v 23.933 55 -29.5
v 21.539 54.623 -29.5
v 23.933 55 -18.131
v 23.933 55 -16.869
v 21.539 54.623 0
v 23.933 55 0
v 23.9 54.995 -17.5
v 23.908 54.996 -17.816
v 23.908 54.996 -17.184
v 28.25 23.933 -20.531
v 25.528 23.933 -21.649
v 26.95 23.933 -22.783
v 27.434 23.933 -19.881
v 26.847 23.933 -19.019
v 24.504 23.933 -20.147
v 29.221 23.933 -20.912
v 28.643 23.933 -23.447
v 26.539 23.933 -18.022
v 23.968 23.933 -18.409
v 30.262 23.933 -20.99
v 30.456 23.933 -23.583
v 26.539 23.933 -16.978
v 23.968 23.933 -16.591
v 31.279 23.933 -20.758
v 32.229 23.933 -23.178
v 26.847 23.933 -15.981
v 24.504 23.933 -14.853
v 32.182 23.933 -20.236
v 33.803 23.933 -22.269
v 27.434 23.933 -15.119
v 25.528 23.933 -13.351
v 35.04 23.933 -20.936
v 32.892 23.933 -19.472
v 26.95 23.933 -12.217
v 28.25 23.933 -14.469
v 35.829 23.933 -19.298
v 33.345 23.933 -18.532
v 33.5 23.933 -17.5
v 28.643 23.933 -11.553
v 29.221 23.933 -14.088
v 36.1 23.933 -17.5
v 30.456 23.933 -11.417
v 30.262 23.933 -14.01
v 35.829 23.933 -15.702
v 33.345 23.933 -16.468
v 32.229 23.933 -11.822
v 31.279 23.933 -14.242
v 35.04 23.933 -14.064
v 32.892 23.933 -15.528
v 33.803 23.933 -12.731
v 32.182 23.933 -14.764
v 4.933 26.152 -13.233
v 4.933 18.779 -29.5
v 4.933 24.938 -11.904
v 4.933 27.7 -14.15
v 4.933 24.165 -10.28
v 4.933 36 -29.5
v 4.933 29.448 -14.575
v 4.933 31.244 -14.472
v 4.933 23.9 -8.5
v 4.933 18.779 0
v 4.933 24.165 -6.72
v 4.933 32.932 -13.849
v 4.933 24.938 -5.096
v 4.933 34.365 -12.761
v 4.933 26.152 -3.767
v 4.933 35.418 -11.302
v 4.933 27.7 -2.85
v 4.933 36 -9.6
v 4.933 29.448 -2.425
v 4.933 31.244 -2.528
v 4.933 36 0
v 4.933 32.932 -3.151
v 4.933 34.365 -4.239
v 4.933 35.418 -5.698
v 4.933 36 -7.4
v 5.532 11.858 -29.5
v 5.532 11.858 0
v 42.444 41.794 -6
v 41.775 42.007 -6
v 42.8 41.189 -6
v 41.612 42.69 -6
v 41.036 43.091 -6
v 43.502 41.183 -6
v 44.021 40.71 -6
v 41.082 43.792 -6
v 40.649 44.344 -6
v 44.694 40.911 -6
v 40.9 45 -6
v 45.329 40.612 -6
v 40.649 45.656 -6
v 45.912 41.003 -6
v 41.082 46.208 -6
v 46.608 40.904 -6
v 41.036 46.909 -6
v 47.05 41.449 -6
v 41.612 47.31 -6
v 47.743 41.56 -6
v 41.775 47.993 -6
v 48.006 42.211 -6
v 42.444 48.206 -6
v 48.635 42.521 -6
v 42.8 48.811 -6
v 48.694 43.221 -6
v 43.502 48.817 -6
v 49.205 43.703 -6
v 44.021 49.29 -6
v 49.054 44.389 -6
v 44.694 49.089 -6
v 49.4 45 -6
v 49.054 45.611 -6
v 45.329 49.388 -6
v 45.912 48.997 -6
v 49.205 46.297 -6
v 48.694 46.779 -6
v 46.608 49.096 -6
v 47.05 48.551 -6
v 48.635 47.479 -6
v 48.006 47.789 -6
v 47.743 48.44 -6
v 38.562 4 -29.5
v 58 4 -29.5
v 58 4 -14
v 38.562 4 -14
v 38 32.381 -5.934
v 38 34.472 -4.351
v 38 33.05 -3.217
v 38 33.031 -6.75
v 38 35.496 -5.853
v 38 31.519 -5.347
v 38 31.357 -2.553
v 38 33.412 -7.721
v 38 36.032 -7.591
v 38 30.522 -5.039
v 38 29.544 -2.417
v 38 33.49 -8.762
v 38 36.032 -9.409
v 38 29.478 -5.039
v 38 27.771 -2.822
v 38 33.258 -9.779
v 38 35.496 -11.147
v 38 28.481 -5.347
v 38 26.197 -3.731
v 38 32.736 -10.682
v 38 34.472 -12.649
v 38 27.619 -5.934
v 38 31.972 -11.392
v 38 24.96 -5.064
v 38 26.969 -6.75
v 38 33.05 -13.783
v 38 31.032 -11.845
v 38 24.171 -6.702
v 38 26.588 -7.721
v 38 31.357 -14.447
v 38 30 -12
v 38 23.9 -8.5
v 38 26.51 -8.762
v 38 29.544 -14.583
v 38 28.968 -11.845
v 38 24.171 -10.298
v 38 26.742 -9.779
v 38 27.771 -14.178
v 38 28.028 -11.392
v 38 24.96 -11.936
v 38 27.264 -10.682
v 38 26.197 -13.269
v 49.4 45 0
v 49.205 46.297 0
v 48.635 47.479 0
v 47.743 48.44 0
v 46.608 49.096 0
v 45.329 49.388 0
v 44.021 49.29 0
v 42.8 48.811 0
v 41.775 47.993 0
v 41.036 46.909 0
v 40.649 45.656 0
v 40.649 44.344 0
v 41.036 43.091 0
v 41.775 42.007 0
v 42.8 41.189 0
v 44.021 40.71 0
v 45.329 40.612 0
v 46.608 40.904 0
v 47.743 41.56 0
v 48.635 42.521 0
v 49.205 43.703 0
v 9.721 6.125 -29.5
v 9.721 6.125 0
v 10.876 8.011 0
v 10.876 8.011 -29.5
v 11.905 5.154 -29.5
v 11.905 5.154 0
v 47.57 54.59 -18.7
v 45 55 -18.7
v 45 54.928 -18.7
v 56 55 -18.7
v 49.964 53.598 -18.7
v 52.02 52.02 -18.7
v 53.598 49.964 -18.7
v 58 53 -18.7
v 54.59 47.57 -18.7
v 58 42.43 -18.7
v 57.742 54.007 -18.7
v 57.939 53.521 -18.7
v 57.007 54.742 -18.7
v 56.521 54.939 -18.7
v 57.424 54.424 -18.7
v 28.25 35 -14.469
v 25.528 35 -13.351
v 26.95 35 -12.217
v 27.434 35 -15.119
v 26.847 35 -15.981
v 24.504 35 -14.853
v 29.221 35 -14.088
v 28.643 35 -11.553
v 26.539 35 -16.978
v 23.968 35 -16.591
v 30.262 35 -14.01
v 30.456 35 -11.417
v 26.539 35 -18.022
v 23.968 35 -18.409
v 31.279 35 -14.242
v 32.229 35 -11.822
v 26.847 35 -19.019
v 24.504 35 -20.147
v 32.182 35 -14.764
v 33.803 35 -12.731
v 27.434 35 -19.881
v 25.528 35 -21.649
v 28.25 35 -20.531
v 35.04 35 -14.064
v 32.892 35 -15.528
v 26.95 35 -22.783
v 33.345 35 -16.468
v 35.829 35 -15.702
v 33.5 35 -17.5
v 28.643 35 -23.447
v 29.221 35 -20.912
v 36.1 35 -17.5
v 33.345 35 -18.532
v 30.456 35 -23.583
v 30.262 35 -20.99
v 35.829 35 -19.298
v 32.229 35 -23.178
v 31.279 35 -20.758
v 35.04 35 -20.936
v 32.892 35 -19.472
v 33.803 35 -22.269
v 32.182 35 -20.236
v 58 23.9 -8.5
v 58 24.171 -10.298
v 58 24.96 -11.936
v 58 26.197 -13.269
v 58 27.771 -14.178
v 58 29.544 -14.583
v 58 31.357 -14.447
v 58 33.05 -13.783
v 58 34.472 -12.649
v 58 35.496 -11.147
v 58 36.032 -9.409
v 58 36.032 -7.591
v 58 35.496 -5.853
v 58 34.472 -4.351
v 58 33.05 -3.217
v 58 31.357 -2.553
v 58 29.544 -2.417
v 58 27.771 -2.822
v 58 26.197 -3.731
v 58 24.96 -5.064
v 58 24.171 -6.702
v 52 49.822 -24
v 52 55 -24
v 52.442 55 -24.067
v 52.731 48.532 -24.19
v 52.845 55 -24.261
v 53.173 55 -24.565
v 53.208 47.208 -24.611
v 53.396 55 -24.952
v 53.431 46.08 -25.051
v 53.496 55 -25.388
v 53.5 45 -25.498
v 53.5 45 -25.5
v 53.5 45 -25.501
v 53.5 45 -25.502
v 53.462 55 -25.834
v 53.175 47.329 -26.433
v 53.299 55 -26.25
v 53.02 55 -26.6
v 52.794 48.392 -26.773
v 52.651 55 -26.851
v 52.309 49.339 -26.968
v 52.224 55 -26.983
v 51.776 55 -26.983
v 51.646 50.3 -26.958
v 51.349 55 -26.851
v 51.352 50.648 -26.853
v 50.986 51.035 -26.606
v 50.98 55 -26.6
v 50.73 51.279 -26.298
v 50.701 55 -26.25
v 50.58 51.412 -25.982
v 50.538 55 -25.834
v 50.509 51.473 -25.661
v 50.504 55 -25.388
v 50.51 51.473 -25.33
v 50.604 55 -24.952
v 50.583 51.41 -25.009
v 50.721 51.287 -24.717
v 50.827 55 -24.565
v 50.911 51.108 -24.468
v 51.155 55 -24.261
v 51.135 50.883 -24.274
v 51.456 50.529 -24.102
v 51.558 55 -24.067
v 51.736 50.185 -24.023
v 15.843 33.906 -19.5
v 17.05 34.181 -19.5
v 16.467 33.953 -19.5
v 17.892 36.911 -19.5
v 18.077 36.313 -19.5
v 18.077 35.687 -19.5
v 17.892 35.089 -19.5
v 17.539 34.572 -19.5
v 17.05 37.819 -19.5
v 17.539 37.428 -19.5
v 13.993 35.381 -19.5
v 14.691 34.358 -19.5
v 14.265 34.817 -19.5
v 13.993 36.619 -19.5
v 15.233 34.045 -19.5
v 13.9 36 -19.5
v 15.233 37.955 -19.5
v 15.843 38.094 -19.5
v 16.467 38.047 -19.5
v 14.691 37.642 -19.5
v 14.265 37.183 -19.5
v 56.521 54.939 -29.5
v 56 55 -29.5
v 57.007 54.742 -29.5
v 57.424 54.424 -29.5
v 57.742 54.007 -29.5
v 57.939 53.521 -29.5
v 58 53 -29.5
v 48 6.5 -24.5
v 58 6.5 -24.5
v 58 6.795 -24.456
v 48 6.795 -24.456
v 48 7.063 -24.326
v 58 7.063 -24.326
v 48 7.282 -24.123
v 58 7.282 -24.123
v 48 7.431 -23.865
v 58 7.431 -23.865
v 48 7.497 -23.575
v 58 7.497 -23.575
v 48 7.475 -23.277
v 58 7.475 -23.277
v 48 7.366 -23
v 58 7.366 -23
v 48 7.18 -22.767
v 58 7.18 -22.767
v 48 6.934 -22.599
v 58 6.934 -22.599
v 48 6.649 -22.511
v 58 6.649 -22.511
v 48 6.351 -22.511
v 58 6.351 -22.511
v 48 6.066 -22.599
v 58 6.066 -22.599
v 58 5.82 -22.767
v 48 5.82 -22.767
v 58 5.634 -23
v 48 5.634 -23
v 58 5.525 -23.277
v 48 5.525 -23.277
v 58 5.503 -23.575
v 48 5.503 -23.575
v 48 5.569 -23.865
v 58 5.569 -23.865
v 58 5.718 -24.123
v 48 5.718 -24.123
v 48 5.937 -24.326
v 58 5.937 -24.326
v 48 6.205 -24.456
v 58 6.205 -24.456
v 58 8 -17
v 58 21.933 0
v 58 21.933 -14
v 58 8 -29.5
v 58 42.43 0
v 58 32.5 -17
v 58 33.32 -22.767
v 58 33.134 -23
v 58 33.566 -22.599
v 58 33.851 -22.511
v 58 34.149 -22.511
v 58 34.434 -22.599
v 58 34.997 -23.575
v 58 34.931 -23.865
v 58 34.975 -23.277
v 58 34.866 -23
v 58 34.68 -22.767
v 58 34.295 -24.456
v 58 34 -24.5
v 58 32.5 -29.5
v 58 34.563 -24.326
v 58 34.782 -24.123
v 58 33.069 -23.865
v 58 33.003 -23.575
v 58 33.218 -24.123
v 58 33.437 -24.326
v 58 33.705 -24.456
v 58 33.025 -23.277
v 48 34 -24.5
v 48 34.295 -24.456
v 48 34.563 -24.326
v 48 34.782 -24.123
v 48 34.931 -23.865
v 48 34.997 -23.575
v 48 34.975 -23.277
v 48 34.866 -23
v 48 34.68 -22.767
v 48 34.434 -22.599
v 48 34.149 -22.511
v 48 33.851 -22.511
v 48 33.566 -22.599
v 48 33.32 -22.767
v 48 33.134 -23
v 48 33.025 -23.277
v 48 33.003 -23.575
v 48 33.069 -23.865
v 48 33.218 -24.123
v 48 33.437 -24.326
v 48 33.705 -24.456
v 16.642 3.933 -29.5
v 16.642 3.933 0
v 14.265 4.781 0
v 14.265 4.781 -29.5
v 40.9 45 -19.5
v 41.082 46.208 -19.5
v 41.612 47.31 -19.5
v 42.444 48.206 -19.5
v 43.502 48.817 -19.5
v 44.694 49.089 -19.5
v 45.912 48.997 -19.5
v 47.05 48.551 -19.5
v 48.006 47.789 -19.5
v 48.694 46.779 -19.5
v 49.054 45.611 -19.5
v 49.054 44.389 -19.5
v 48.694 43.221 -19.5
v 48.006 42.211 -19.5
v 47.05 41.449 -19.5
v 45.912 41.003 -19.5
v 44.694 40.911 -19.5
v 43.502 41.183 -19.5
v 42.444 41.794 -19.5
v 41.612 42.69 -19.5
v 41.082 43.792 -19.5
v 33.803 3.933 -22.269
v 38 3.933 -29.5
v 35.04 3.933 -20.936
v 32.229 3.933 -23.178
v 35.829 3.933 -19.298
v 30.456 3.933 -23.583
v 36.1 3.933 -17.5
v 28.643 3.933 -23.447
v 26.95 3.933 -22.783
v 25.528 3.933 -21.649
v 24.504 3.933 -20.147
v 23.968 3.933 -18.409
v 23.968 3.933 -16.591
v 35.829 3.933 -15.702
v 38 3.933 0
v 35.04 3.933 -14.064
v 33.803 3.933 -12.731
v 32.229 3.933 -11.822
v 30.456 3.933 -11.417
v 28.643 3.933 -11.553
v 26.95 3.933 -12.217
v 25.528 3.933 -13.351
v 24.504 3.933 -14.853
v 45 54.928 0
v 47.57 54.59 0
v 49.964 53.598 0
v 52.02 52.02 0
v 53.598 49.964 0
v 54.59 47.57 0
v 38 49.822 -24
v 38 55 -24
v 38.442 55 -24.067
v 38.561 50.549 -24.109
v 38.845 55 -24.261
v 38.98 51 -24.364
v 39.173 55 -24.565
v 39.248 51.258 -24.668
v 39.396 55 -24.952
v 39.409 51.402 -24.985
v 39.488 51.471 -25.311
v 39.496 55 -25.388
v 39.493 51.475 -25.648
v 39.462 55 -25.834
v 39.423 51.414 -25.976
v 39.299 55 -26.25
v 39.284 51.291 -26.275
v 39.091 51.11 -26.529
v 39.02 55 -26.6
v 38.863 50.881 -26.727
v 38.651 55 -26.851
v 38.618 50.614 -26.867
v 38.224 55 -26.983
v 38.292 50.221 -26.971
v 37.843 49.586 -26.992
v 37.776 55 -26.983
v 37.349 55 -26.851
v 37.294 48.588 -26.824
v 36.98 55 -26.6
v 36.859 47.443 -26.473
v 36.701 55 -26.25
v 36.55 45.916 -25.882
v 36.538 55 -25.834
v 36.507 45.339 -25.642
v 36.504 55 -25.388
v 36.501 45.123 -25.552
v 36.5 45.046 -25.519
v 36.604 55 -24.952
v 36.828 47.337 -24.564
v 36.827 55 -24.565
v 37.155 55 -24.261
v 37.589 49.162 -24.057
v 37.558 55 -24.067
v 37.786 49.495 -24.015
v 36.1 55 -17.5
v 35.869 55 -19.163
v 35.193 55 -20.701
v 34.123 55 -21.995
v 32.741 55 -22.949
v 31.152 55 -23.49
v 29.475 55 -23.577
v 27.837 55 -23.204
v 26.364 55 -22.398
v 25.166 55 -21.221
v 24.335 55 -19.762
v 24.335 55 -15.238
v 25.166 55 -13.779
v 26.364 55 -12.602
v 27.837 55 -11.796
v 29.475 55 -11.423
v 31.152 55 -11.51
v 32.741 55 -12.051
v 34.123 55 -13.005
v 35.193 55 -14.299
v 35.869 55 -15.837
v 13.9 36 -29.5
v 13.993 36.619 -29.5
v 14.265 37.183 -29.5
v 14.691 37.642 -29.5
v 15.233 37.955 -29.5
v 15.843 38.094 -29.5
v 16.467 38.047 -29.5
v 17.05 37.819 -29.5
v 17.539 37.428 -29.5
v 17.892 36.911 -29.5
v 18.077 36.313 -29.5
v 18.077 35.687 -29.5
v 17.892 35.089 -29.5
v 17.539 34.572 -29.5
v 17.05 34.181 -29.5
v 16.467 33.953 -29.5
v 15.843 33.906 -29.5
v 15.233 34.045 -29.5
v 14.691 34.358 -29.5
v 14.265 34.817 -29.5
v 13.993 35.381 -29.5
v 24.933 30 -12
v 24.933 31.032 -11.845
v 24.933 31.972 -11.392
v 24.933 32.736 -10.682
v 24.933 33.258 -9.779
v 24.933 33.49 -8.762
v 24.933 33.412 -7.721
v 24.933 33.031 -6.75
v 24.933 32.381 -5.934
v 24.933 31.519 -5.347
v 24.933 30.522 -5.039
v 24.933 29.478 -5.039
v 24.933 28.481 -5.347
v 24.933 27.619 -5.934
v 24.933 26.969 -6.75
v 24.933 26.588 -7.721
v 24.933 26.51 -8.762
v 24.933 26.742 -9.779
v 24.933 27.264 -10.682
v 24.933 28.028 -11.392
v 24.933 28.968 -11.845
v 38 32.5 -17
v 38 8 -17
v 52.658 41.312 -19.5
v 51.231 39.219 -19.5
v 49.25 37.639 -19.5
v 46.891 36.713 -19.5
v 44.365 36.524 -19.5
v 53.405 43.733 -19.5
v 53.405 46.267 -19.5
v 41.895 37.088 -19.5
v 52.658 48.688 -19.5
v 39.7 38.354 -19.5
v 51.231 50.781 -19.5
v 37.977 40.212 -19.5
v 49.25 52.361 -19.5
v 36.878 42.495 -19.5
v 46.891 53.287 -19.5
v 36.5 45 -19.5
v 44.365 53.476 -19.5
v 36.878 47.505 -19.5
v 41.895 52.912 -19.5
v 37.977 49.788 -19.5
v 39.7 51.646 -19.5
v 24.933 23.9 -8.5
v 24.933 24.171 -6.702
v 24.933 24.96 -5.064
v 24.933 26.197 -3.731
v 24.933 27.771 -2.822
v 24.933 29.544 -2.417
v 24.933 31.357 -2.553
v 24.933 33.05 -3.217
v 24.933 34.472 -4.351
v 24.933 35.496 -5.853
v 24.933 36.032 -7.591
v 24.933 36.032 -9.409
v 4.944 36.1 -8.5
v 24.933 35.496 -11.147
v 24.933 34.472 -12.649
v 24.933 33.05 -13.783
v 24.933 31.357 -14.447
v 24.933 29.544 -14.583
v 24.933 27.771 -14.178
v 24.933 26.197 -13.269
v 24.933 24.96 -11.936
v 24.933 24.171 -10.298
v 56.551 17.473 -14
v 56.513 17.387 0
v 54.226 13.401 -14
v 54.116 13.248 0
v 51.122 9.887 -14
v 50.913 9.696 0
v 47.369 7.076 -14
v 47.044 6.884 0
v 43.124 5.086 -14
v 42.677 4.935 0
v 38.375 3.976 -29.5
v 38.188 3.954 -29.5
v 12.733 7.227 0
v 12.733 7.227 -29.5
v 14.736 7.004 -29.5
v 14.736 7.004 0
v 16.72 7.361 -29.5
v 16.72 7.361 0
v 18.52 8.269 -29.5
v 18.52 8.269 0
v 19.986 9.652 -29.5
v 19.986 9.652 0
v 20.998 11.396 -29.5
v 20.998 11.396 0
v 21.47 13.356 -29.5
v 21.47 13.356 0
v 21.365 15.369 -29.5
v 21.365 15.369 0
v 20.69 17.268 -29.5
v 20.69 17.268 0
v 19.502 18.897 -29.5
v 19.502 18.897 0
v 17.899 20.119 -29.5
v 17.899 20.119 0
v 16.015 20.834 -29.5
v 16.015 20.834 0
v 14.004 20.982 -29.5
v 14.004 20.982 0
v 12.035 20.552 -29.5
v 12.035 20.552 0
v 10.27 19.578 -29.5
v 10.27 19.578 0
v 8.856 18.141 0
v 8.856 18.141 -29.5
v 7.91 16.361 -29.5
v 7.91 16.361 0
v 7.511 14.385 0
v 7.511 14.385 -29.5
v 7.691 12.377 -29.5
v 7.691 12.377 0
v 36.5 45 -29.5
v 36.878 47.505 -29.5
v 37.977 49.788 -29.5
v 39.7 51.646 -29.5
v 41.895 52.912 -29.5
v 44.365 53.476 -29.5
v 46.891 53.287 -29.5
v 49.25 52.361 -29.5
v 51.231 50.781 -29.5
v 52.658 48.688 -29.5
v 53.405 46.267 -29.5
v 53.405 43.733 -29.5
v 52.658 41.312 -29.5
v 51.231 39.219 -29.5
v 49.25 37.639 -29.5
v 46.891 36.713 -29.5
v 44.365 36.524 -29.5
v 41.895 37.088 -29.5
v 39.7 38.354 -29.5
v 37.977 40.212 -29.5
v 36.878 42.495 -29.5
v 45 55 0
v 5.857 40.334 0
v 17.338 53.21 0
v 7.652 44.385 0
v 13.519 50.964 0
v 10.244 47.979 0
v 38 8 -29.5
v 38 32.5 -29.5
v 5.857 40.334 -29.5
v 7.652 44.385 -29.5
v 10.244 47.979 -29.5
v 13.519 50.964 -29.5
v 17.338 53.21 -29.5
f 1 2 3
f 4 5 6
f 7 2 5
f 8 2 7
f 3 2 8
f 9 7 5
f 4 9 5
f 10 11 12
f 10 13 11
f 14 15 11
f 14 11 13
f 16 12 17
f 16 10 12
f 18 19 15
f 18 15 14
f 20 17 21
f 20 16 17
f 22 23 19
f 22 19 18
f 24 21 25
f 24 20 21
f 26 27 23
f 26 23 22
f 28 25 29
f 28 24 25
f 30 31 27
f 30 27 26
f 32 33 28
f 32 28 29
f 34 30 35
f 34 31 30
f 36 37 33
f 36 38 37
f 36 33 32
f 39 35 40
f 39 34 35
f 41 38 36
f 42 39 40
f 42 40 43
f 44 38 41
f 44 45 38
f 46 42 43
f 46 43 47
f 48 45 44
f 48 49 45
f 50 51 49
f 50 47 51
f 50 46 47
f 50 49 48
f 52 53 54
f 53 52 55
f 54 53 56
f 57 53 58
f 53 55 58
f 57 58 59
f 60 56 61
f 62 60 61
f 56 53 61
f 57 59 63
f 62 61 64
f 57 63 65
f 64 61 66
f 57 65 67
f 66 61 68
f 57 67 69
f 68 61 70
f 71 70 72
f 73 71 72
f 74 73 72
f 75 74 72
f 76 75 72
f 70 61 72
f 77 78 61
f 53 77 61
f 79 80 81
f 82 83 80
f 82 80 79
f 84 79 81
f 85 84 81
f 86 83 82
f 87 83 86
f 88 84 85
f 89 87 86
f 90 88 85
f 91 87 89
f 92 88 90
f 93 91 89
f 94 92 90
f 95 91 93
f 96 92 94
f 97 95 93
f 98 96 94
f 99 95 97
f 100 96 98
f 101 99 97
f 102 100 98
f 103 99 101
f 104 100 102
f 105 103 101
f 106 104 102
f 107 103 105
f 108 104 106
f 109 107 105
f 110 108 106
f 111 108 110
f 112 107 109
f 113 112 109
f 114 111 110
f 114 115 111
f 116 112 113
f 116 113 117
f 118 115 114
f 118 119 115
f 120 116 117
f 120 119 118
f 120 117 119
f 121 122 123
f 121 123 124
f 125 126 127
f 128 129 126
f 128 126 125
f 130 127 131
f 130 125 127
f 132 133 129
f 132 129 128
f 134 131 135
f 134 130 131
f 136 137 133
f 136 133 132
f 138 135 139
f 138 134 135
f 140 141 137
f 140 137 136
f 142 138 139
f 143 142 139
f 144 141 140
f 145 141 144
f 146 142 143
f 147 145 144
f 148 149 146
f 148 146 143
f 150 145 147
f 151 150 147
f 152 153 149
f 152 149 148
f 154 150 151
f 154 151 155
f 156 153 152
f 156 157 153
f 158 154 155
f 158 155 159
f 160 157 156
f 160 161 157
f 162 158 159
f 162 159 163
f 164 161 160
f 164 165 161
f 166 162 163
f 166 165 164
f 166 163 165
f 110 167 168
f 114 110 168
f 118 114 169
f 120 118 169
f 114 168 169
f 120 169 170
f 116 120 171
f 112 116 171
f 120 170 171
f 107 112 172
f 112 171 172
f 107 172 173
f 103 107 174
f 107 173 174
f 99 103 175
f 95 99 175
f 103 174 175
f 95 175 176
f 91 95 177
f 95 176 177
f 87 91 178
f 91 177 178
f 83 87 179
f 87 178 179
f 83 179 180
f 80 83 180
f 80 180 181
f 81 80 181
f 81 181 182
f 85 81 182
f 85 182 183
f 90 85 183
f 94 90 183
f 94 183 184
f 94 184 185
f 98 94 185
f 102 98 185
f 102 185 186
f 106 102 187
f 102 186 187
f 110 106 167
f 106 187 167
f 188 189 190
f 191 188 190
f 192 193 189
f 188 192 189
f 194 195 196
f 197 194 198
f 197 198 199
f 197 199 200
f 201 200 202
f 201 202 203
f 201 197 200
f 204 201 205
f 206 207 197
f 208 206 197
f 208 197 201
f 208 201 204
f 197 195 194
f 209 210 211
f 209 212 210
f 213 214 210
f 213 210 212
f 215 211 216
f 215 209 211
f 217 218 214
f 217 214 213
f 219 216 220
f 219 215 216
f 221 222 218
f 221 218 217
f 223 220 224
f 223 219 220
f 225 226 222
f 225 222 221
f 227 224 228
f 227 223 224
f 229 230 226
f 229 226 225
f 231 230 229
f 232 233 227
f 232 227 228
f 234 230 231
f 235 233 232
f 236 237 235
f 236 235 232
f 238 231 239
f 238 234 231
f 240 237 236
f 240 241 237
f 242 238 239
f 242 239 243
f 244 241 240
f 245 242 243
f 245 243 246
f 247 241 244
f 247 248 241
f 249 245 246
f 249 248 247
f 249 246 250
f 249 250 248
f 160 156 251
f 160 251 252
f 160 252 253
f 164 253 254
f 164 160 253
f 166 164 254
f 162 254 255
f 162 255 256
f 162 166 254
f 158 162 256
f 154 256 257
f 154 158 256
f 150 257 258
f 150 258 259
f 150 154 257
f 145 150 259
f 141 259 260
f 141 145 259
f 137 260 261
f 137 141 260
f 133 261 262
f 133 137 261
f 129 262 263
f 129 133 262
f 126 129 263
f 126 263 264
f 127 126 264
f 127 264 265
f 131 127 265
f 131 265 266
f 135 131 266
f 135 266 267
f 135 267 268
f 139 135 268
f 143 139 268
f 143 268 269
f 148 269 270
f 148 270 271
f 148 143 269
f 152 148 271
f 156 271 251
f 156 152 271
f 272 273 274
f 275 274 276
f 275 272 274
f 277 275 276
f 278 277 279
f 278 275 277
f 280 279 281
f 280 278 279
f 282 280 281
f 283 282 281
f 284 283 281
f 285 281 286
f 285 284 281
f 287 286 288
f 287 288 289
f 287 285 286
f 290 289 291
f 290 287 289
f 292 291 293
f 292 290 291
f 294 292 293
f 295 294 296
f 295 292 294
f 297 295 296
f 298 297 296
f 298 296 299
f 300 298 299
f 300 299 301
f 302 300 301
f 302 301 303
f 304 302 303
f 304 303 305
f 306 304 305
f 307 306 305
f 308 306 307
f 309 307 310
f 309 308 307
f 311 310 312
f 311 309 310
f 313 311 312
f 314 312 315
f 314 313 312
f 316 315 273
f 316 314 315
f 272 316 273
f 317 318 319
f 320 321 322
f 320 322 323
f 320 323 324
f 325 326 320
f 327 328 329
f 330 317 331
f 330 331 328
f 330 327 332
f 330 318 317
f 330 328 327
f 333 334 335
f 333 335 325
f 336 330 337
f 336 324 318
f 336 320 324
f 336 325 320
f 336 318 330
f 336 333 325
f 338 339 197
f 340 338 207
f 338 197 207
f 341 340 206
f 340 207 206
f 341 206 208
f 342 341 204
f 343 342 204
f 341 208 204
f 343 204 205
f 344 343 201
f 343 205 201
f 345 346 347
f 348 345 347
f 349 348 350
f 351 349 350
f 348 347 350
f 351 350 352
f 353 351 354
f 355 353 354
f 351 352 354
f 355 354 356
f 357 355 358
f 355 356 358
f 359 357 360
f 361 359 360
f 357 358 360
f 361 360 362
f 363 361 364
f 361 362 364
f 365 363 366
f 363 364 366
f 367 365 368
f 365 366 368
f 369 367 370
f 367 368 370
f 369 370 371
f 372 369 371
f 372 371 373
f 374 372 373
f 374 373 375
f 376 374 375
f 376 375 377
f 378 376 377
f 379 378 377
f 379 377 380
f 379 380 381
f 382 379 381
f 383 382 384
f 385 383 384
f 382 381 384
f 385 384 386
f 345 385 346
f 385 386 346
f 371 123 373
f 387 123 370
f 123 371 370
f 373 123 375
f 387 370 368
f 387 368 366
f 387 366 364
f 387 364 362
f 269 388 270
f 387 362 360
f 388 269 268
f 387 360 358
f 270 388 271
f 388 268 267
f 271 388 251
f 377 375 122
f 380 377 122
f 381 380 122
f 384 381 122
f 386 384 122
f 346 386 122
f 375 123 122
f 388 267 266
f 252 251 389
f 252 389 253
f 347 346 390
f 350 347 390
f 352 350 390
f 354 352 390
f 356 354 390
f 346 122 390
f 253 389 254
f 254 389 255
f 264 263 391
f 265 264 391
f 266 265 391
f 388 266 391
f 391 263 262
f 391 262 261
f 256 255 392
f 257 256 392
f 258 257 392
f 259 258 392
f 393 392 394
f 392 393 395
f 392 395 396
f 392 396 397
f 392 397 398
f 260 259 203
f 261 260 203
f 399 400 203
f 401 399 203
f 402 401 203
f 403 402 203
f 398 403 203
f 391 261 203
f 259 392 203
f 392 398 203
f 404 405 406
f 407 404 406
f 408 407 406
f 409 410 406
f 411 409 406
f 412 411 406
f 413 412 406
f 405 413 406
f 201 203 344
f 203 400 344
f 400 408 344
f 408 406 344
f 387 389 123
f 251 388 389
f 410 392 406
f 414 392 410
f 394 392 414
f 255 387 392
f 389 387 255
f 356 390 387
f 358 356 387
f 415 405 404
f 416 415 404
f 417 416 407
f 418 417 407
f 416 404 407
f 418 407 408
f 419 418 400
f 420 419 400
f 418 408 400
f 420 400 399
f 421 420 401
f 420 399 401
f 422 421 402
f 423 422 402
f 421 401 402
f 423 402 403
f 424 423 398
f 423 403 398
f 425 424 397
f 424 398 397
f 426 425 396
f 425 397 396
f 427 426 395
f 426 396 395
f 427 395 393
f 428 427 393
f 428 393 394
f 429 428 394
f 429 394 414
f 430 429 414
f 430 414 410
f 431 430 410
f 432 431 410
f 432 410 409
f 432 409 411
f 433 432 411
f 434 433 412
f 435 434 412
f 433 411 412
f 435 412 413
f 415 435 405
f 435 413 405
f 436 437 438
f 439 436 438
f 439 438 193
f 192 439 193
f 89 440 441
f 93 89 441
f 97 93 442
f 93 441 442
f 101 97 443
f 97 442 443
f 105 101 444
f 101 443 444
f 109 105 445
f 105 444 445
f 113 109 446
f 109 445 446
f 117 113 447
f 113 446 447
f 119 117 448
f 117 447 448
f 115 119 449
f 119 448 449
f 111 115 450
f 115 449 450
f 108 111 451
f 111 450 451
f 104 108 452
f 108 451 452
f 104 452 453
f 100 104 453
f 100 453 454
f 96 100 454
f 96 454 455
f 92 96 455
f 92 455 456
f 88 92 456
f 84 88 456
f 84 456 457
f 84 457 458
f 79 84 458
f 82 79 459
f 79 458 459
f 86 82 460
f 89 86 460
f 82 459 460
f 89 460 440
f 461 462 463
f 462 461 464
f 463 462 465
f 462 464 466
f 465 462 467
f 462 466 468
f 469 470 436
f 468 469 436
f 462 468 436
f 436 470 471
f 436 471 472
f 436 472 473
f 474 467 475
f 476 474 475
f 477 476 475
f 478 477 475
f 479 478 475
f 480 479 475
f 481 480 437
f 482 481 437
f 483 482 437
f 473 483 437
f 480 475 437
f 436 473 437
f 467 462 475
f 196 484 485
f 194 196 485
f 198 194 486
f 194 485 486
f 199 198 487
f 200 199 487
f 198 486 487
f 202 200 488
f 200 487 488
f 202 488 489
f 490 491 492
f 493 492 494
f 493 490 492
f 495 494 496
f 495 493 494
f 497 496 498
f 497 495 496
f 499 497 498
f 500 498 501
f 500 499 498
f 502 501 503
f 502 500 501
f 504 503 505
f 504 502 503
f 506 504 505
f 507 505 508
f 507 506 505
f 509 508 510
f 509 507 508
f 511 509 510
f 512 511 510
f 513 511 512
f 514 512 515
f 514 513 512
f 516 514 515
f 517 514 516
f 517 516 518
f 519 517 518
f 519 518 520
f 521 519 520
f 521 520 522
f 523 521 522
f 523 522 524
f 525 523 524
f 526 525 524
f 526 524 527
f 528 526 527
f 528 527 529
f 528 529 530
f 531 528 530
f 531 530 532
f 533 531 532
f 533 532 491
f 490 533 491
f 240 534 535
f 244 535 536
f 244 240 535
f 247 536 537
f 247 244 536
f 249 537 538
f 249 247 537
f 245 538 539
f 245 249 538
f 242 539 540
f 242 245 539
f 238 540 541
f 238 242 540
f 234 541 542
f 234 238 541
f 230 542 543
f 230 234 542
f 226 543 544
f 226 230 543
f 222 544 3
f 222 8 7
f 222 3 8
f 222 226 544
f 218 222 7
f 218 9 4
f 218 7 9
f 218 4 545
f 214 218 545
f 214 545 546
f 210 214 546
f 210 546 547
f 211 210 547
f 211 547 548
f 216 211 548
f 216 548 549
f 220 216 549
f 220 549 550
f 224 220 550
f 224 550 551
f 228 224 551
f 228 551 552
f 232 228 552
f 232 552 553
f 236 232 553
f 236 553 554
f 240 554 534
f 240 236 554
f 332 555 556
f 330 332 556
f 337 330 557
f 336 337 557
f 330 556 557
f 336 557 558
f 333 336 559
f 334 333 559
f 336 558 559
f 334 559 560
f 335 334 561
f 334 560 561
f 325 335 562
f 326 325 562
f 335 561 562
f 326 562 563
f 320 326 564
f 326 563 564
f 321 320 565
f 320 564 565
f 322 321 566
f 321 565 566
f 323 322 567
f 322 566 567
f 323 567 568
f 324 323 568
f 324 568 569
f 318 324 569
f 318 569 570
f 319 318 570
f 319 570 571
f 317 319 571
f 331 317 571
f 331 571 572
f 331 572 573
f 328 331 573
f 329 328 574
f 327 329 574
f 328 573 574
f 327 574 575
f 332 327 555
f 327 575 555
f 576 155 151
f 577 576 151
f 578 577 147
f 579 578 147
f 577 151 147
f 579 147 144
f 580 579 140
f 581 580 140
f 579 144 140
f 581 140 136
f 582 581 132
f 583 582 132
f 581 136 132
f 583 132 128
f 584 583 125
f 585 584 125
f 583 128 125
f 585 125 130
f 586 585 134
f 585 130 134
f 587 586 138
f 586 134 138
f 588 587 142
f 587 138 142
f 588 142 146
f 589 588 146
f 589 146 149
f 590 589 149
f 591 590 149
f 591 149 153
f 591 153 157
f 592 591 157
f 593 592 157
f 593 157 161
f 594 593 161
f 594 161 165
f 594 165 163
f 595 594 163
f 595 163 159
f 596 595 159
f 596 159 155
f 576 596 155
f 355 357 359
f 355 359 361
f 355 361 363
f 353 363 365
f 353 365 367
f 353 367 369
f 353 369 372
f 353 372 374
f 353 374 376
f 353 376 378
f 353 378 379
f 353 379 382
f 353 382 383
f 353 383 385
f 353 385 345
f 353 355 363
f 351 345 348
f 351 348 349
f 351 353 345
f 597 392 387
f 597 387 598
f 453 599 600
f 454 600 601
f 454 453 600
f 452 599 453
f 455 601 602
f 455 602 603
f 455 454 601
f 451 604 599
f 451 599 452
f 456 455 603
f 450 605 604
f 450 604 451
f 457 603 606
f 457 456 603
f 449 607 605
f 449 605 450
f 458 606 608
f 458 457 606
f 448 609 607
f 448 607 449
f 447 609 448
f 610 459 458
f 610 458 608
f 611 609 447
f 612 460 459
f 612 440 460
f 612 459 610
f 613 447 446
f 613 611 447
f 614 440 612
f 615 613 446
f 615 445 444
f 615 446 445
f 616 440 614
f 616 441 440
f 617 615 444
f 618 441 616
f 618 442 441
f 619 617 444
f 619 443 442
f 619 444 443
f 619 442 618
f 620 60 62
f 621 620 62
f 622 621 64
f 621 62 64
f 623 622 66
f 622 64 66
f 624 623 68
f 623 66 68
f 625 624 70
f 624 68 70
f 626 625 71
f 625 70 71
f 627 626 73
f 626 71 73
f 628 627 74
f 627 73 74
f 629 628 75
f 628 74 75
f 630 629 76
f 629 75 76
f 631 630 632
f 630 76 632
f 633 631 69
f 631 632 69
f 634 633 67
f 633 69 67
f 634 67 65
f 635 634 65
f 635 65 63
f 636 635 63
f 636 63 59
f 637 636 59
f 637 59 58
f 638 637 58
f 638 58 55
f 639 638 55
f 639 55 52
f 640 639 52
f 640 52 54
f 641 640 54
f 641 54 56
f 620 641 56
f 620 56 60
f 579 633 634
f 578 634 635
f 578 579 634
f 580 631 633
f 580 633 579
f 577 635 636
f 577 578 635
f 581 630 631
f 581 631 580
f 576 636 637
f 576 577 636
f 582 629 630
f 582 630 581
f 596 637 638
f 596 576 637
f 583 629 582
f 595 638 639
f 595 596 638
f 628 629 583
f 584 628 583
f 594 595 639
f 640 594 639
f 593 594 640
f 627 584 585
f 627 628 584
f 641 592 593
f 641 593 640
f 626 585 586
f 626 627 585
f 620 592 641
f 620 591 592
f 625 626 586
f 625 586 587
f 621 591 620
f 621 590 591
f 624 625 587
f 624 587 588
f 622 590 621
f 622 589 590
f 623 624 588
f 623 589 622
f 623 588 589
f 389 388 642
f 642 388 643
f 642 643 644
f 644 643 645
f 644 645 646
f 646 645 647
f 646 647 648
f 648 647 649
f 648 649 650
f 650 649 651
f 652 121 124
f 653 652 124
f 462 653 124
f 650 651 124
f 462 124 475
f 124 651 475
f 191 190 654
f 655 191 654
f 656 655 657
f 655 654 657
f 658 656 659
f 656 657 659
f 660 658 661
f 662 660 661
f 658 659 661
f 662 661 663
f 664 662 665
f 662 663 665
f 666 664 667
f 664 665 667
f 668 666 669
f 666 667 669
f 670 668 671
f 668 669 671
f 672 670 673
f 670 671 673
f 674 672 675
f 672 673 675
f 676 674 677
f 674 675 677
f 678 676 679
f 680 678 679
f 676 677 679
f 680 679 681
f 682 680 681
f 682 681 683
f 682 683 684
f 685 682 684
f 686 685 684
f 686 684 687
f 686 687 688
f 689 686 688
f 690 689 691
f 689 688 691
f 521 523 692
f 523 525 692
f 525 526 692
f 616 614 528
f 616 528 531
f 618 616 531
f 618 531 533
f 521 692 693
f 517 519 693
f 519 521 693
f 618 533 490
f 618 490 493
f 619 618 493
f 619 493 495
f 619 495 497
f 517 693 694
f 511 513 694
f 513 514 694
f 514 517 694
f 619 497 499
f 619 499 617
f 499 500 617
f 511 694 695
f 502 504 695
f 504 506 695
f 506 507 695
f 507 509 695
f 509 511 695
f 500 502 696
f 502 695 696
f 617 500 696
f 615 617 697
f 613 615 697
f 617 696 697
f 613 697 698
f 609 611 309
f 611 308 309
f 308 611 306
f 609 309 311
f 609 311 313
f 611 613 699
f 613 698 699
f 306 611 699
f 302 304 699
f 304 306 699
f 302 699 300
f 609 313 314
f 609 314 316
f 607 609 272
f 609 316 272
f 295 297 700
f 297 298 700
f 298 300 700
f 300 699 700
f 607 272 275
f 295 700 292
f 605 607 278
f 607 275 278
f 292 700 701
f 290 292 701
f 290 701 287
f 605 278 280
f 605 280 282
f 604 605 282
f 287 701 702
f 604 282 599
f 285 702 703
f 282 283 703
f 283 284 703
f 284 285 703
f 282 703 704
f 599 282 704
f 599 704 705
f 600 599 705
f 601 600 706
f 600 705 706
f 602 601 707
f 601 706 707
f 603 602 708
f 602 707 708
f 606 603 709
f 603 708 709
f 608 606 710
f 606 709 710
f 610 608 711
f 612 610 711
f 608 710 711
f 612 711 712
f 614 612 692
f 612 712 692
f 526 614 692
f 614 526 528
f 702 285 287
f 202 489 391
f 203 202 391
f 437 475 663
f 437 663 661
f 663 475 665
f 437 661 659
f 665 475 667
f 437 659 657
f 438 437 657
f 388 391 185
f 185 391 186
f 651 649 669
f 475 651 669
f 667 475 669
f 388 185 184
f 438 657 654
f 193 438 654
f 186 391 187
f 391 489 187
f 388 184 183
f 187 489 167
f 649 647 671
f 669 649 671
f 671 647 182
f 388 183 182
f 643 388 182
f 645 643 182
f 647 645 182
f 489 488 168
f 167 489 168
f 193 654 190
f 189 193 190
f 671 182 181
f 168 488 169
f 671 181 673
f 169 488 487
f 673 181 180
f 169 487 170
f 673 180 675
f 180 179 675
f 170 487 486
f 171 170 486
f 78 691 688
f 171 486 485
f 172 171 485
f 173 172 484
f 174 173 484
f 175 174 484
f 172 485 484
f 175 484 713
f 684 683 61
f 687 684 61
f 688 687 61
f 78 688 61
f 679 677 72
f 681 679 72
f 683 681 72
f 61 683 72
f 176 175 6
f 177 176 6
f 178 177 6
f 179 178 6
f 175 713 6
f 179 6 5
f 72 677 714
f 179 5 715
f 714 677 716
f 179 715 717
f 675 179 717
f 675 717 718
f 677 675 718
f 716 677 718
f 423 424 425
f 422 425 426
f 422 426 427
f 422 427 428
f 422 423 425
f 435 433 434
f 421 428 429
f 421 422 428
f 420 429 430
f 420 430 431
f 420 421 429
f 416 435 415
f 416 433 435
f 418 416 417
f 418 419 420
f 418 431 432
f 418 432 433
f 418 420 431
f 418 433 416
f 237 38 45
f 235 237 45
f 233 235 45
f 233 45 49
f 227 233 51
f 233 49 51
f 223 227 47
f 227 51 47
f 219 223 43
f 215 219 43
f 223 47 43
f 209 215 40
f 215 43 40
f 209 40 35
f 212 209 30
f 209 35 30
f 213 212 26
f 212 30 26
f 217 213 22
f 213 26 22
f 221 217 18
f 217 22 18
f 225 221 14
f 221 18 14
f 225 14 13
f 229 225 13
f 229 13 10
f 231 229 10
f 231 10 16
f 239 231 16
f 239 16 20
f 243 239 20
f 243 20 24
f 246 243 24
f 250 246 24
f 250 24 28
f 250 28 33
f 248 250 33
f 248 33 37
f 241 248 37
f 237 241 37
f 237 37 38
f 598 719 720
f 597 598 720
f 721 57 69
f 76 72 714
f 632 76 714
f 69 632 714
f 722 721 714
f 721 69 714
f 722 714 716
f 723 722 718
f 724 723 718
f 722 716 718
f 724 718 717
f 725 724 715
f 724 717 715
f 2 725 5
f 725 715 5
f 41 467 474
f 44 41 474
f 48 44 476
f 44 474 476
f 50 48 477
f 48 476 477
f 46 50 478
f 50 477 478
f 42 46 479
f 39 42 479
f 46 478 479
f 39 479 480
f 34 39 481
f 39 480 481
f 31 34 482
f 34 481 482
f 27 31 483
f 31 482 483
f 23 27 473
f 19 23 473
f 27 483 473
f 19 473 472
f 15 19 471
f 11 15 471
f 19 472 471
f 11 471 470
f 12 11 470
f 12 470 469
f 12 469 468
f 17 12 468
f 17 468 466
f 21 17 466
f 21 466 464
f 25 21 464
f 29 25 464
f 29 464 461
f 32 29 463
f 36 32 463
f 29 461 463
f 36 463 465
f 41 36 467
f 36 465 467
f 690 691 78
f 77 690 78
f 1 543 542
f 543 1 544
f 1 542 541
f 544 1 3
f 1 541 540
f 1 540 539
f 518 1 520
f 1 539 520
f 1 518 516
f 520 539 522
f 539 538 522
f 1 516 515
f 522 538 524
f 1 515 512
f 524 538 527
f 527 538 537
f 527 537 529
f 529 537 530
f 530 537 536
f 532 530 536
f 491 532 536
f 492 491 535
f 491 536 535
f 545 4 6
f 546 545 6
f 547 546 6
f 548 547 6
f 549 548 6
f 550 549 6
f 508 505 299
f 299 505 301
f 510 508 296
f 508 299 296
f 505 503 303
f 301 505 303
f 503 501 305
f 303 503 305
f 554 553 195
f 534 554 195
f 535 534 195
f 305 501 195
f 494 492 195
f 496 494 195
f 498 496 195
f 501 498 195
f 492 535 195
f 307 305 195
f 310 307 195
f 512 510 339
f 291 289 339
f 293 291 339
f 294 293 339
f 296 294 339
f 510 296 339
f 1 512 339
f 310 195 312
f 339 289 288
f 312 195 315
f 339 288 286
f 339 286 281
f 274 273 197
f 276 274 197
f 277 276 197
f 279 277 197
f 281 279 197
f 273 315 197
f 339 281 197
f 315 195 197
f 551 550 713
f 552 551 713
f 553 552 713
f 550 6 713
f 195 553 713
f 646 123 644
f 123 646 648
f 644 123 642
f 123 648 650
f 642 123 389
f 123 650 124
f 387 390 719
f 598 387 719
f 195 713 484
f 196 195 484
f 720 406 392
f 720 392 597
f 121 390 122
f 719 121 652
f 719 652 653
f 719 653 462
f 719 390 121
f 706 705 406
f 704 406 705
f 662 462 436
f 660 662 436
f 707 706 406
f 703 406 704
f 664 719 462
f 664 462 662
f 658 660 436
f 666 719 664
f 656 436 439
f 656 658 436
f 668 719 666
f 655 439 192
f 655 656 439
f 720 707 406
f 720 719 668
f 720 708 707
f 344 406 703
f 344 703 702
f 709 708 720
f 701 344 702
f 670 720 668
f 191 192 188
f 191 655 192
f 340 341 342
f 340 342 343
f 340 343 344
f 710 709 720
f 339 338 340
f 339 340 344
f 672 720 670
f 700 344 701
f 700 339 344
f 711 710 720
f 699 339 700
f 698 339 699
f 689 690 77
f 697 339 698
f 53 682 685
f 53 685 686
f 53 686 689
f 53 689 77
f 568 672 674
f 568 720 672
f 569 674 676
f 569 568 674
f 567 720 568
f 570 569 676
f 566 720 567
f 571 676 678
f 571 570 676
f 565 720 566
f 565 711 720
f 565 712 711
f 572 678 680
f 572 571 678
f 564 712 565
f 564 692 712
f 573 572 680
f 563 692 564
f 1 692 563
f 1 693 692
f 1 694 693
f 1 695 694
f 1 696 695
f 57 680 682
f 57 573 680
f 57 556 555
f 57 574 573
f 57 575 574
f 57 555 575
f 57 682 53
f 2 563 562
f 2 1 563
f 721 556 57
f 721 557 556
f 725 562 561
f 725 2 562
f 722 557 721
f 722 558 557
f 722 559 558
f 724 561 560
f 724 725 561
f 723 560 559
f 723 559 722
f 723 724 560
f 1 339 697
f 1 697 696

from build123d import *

# Parameters (mm, degrees)
SALIENTE_EXTRUIR1_DEPTH = 29.5
CORTAR_EXTRUIR11_DEPTH  = 18.7
CROQUIS12_W             = 20
CROQUIS12_H             = 28.5
SALIENTE_EXTRUIR2_DEPTH = 15.5
CROQUIS6_R              = 8.5
CORTAR_EXTRUIR1_DEPTH   = 10
CROQUIS7_R              = 4.1
CORTAR_EXTRUIR2_DEPTH   = 13.5
CROQUIS8_R              = 4.4
CORTAR_EXTRUIR3_DEPTH   = 6
CROQUIS2_R              = 6.1
CORTAR_EXTRUIR4_DEPTH   = 20
CORTAR_EXTRUIR5_START   = -20
CROQUIS3_R              = 6.1
CORTAR_EXTRUIR5_DEPTH   = 20
CROQUIS4_R              = 6.1
CORTAR_EXTRUIR6_DEPTH   = 20
CORTAR_EXTRUIR7_START   = -20
CROQUIS5_R              = 6.1
CORTAR_EXTRUIR7_DEPTH   = 20
CORTAR_EXTRUIR8_REACH   = 72.631
CROQUIS9_R              = 3.5
CORTAR_EXTRUIR9_REACH   = 74.107
CROQUIS10_R             = 3.5
CROQUIS13_W             = 20
CROQUIS13_H             = 24.5
CORTAR_EXTRUIR10_DEPTH  = 12.5
CORTAR_EXTRUIR12_START  = -10
CROQUIS18_R             = 1.5
CORTAR_EXTRUIR12_DEPTH  = 10
CROQUIS19_R             = 1
CORTAR_EXTRUIR13_DEPTH  = 10
CROQUIS20_R             = 2.1
CORTAR_EXTRUIR14_DEPTH  = 10


with BuildPart() as part:
    # Croquis1 → Saliente-Extruir1 (new body)
    with BuildSketch(Plane.XY):
        with BuildLine():
            Line((5.532260486, 11.858052865), (4.932758535, 18.779017183))
            Line((4.932758535, 18.779017183), (4.932758535, 36))
            ThreePointArc((4.932758535, 36), (10.243586381, 47.979347327), (21.538526154, 54.62268913))
            Line((21.538526154, 54.62268913), (23.932758535, 55))
            Line((23.932758535, 55), (56, 55))
            ThreePointArc((56, 55), (57.424264069, 54.424264069), (58, 53))
            Line((58, 53), (58, 21.932758535))
            ThreePointArc((58, 21.932758535), (50.913097547, 9.695983483), (38, 3.932758535))
            Line((38, 3.932758535), (16.641947135, 3.932758535))
            Line((16.641947135, 3.932758535), (14.26534365, 4.78116089))
            Line((14.26534365, 4.78116089), (11.904731608, 5.153727551))
            Line((11.904731608, 5.153727551), (9.720982817, 6.124570664))
            Line((9.720982817, 6.124570664), (10.875746205, 8.011278565))
            ThreePointArc((10.875746205, 8.011278565), (20.155175368, 18.125408047), (7.690637501, 12.377476547))
            Line((7.690637501, 12.377476547), (5.532260486, 11.858052865))
        make_face()
    extrude(amount=-SALIENTE_EXTRUIR1_DEPTH)

    # Croquis15 → Cortar-Extruir11 (cut)
    with BuildSketch(Plane.XY):
        with BuildLine():
            Line((58, 42.430465887), (58, 53))
            ThreePointArc((58, 53), (57.424264069, 54.424264069), (56, 55))
            Line((56, 55), (45, 55))
            Line((45, 55), (45, 54.927917446))
            ThreePointArc((45, 54.927917446), (51.043733212, 52.876346468), (54.589631863, 47.569534113))
            Line((54.589631863, 47.569534113), (58, 42.430465887))
        make_face()
    extrude(amount=-CORTAR_EXTRUIR11_DEPTH, mode=Mode.SUBTRACT)

    # Croquis12 → Saliente-Extruir2 (add)
    with BuildSketch(Plane(origin=(0, 0, -29.5), x_dir=(-1, 0, 0), z_dir=(0, 0, -1))):
        with Locations((-48, 18.25)):
            Rectangle(CROQUIS12_W, CROQUIS12_H)
    extrude(amount=-SALIENTE_EXTRUIR2_DEPTH)

    # Croquis6 → Cortar-Extruir1 (cut)
    with BuildSketch(Plane(origin=(0, 0, -29.5), x_dir=(-1, 0, 0), z_dir=(0, 0, -1))):
        with Locations((-45, 45)):
            Circle(CROQUIS6_R)
    extrude(amount=-CORTAR_EXTRUIR1_DEPTH, mode=Mode.SUBTRACT)

    # Croquis7 → Cortar-Extruir2 (cut)
    with BuildSketch(Plane(origin=(0, 0, -19.5), x_dir=(-1, 0, 0), z_dir=(0, 0, -1))):
        with Locations((-45, 45)):
            Circle(CROQUIS7_R)
    extrude(amount=-CORTAR_EXTRUIR2_DEPTH, mode=Mode.SUBTRACT)

    # Croquis8 → Cortar-Extruir3 (cut)
    with BuildSketch(Plane.XY):
        with Locations((45, 45)):
            Circle(CROQUIS8_R)
    extrude(amount=-CORTAR_EXTRUIR3_DEPTH, mode=Mode.SUBTRACT)

    # Croquis2 → Cortar-Extruir4 (cut)
    with BuildSketch(Plane.XZ.offset(-3.932758535)):
        with Locations((30, -17.5)):
            Circle(CROQUIS2_R)
    extrude(amount=-CORTAR_EXTRUIR4_DEPTH, mode=Mode.SUBTRACT)

    # Croquis3 → Cortar-Extruir5 (cut)
    with BuildSketch(Plane(origin=(0, 55, 0), x_dir=(1, 0, 0), z_dir=(0, 1, 0)).offset(CORTAR_EXTRUIR5_START)):
        with Locations((30, 17.5)):
            Circle(CROQUIS3_R)
    extrude(amount=CORTAR_EXTRUIR5_DEPTH, mode=Mode.SUBTRACT)

    # Croquis4 → Cortar-Extruir6 (cut)
    with BuildSketch(Plane.ZY.offset(-4.932758535)):
        with Locations(Location((-8.5, 30, 0), (0, 0, 270))):
            Circle(CROQUIS4_R)
    extrude(amount=-CORTAR_EXTRUIR6_DEPTH, mode=Mode.SUBTRACT)

    # Croquis5 → Cortar-Extruir7 (cut)
    with BuildSketch(Plane(origin=(58, 0, 0), x_dir=(0, 0, -1), z_dir=(1, 0, 0)).offset(CORTAR_EXTRUIR7_START)):
        with Locations(Location((8.5, 30, 0), (0, 0, 270))):
            Circle(CROQUIS5_R)
    extrude(amount=CORTAR_EXTRUIR7_DEPTH, mode=Mode.SUBTRACT)

    # Croquis9 → Cortar-Extruir8 (cut, up to next)
    with BuildSketch(Plane(origin=(38, 0, 0), x_dir=(0, 0, -1), z_dir=(1, 0, 0)), mode=Mode.PRIVATE) as cortar_extruir8_sk1:
        with Locations((8.5, 30)):
            Circle(CROQUIS9_R)
    cortar_extruir8_tool1 = extrude(cortar_extruir8_sk1.sketch, amount=-CORTAR_EXTRUIR8_REACH, mode=Mode.PRIVATE) & part.part
    add(cortar_extruir8_tool1.solids().sort_by_distance((38, 30, -8.5))[0], mode=Mode.SUBTRACT)

    # Croquis10 → Cortar-Extruir9 (cut, up to next)
    with BuildSketch(Plane.XZ.offset(-23.932758535), mode=Mode.PRIVATE) as cortar_extruir9_sk1:
        with Locations((30, -17.5)):
            Circle(CROQUIS10_R)
    cortar_extruir9_tool1 = extrude(cortar_extruir9_sk1.sketch, amount=-CORTAR_EXTRUIR9_REACH, mode=Mode.PRIVATE) & part.part
    add(cortar_extruir9_tool1.solids().sort_by_distance((30, 23.932759, -17.5))[0], mode=Mode.SUBTRACT)

    # Croquis13 → Cortar-Extruir10 (cut)
    with BuildSketch(Plane(origin=(0, 0, -29.5), x_dir=(-1, 0, 0), z_dir=(0, 0, -1))):
        with Locations((-48, 20.25)):
            Rectangle(CROQUIS13_W, CROQUIS13_H)
    extrude(amount=-CORTAR_EXTRUIR10_DEPTH, mode=Mode.SUBTRACT)

    # Croquis18 → Cortar-Extruir12 (cut)
    with BuildSketch(Plane(origin=(0, 55, 0), x_dir=(1, 0, 0), z_dir=(0, 1, 0)).offset(CORTAR_EXTRUIR12_START)):
        with Locations(Location((38.000000773, 25.50000943, 0), (0, 0, 270))):
            Circle(CROQUIS18_R)
        with Locations(Location((52.000000773, 25.50000943, 0), (0, 0, 270))):
            Circle(CROQUIS18_R)
    extrude(amount=CORTAR_EXTRUIR12_DEPTH, mode=Mode.SUBTRACT)

    # Croquis19 → Cortar-Extruir13 (cut)
    with BuildSketch(Plane(origin=(58, 0, 0), x_dir=(0, 0, -1), z_dir=(1, 0, 0))):
        with Locations((23.5, 34)):
            Circle(CROQUIS19_R)
        with Locations((23.5, 6.5)):
            Circle(CROQUIS19_R)
    extrude(amount=-CORTAR_EXTRUIR13_DEPTH, mode=Mode.SUBTRACT)

    # Croquis20 → Cortar-Extruir14 (cut)
    with BuildSketch(Plane(origin=(0, 0, -29.5), x_dir=(-1, 0, 0), z_dir=(0, 0, -1))):
        with Locations((-16, 36)):
            Circle(CROQUIS20_R)
    extrude(amount=-CORTAR_EXTRUIR14_DEPTH, mode=Mode.SUBTRACT)


solid = part.part
